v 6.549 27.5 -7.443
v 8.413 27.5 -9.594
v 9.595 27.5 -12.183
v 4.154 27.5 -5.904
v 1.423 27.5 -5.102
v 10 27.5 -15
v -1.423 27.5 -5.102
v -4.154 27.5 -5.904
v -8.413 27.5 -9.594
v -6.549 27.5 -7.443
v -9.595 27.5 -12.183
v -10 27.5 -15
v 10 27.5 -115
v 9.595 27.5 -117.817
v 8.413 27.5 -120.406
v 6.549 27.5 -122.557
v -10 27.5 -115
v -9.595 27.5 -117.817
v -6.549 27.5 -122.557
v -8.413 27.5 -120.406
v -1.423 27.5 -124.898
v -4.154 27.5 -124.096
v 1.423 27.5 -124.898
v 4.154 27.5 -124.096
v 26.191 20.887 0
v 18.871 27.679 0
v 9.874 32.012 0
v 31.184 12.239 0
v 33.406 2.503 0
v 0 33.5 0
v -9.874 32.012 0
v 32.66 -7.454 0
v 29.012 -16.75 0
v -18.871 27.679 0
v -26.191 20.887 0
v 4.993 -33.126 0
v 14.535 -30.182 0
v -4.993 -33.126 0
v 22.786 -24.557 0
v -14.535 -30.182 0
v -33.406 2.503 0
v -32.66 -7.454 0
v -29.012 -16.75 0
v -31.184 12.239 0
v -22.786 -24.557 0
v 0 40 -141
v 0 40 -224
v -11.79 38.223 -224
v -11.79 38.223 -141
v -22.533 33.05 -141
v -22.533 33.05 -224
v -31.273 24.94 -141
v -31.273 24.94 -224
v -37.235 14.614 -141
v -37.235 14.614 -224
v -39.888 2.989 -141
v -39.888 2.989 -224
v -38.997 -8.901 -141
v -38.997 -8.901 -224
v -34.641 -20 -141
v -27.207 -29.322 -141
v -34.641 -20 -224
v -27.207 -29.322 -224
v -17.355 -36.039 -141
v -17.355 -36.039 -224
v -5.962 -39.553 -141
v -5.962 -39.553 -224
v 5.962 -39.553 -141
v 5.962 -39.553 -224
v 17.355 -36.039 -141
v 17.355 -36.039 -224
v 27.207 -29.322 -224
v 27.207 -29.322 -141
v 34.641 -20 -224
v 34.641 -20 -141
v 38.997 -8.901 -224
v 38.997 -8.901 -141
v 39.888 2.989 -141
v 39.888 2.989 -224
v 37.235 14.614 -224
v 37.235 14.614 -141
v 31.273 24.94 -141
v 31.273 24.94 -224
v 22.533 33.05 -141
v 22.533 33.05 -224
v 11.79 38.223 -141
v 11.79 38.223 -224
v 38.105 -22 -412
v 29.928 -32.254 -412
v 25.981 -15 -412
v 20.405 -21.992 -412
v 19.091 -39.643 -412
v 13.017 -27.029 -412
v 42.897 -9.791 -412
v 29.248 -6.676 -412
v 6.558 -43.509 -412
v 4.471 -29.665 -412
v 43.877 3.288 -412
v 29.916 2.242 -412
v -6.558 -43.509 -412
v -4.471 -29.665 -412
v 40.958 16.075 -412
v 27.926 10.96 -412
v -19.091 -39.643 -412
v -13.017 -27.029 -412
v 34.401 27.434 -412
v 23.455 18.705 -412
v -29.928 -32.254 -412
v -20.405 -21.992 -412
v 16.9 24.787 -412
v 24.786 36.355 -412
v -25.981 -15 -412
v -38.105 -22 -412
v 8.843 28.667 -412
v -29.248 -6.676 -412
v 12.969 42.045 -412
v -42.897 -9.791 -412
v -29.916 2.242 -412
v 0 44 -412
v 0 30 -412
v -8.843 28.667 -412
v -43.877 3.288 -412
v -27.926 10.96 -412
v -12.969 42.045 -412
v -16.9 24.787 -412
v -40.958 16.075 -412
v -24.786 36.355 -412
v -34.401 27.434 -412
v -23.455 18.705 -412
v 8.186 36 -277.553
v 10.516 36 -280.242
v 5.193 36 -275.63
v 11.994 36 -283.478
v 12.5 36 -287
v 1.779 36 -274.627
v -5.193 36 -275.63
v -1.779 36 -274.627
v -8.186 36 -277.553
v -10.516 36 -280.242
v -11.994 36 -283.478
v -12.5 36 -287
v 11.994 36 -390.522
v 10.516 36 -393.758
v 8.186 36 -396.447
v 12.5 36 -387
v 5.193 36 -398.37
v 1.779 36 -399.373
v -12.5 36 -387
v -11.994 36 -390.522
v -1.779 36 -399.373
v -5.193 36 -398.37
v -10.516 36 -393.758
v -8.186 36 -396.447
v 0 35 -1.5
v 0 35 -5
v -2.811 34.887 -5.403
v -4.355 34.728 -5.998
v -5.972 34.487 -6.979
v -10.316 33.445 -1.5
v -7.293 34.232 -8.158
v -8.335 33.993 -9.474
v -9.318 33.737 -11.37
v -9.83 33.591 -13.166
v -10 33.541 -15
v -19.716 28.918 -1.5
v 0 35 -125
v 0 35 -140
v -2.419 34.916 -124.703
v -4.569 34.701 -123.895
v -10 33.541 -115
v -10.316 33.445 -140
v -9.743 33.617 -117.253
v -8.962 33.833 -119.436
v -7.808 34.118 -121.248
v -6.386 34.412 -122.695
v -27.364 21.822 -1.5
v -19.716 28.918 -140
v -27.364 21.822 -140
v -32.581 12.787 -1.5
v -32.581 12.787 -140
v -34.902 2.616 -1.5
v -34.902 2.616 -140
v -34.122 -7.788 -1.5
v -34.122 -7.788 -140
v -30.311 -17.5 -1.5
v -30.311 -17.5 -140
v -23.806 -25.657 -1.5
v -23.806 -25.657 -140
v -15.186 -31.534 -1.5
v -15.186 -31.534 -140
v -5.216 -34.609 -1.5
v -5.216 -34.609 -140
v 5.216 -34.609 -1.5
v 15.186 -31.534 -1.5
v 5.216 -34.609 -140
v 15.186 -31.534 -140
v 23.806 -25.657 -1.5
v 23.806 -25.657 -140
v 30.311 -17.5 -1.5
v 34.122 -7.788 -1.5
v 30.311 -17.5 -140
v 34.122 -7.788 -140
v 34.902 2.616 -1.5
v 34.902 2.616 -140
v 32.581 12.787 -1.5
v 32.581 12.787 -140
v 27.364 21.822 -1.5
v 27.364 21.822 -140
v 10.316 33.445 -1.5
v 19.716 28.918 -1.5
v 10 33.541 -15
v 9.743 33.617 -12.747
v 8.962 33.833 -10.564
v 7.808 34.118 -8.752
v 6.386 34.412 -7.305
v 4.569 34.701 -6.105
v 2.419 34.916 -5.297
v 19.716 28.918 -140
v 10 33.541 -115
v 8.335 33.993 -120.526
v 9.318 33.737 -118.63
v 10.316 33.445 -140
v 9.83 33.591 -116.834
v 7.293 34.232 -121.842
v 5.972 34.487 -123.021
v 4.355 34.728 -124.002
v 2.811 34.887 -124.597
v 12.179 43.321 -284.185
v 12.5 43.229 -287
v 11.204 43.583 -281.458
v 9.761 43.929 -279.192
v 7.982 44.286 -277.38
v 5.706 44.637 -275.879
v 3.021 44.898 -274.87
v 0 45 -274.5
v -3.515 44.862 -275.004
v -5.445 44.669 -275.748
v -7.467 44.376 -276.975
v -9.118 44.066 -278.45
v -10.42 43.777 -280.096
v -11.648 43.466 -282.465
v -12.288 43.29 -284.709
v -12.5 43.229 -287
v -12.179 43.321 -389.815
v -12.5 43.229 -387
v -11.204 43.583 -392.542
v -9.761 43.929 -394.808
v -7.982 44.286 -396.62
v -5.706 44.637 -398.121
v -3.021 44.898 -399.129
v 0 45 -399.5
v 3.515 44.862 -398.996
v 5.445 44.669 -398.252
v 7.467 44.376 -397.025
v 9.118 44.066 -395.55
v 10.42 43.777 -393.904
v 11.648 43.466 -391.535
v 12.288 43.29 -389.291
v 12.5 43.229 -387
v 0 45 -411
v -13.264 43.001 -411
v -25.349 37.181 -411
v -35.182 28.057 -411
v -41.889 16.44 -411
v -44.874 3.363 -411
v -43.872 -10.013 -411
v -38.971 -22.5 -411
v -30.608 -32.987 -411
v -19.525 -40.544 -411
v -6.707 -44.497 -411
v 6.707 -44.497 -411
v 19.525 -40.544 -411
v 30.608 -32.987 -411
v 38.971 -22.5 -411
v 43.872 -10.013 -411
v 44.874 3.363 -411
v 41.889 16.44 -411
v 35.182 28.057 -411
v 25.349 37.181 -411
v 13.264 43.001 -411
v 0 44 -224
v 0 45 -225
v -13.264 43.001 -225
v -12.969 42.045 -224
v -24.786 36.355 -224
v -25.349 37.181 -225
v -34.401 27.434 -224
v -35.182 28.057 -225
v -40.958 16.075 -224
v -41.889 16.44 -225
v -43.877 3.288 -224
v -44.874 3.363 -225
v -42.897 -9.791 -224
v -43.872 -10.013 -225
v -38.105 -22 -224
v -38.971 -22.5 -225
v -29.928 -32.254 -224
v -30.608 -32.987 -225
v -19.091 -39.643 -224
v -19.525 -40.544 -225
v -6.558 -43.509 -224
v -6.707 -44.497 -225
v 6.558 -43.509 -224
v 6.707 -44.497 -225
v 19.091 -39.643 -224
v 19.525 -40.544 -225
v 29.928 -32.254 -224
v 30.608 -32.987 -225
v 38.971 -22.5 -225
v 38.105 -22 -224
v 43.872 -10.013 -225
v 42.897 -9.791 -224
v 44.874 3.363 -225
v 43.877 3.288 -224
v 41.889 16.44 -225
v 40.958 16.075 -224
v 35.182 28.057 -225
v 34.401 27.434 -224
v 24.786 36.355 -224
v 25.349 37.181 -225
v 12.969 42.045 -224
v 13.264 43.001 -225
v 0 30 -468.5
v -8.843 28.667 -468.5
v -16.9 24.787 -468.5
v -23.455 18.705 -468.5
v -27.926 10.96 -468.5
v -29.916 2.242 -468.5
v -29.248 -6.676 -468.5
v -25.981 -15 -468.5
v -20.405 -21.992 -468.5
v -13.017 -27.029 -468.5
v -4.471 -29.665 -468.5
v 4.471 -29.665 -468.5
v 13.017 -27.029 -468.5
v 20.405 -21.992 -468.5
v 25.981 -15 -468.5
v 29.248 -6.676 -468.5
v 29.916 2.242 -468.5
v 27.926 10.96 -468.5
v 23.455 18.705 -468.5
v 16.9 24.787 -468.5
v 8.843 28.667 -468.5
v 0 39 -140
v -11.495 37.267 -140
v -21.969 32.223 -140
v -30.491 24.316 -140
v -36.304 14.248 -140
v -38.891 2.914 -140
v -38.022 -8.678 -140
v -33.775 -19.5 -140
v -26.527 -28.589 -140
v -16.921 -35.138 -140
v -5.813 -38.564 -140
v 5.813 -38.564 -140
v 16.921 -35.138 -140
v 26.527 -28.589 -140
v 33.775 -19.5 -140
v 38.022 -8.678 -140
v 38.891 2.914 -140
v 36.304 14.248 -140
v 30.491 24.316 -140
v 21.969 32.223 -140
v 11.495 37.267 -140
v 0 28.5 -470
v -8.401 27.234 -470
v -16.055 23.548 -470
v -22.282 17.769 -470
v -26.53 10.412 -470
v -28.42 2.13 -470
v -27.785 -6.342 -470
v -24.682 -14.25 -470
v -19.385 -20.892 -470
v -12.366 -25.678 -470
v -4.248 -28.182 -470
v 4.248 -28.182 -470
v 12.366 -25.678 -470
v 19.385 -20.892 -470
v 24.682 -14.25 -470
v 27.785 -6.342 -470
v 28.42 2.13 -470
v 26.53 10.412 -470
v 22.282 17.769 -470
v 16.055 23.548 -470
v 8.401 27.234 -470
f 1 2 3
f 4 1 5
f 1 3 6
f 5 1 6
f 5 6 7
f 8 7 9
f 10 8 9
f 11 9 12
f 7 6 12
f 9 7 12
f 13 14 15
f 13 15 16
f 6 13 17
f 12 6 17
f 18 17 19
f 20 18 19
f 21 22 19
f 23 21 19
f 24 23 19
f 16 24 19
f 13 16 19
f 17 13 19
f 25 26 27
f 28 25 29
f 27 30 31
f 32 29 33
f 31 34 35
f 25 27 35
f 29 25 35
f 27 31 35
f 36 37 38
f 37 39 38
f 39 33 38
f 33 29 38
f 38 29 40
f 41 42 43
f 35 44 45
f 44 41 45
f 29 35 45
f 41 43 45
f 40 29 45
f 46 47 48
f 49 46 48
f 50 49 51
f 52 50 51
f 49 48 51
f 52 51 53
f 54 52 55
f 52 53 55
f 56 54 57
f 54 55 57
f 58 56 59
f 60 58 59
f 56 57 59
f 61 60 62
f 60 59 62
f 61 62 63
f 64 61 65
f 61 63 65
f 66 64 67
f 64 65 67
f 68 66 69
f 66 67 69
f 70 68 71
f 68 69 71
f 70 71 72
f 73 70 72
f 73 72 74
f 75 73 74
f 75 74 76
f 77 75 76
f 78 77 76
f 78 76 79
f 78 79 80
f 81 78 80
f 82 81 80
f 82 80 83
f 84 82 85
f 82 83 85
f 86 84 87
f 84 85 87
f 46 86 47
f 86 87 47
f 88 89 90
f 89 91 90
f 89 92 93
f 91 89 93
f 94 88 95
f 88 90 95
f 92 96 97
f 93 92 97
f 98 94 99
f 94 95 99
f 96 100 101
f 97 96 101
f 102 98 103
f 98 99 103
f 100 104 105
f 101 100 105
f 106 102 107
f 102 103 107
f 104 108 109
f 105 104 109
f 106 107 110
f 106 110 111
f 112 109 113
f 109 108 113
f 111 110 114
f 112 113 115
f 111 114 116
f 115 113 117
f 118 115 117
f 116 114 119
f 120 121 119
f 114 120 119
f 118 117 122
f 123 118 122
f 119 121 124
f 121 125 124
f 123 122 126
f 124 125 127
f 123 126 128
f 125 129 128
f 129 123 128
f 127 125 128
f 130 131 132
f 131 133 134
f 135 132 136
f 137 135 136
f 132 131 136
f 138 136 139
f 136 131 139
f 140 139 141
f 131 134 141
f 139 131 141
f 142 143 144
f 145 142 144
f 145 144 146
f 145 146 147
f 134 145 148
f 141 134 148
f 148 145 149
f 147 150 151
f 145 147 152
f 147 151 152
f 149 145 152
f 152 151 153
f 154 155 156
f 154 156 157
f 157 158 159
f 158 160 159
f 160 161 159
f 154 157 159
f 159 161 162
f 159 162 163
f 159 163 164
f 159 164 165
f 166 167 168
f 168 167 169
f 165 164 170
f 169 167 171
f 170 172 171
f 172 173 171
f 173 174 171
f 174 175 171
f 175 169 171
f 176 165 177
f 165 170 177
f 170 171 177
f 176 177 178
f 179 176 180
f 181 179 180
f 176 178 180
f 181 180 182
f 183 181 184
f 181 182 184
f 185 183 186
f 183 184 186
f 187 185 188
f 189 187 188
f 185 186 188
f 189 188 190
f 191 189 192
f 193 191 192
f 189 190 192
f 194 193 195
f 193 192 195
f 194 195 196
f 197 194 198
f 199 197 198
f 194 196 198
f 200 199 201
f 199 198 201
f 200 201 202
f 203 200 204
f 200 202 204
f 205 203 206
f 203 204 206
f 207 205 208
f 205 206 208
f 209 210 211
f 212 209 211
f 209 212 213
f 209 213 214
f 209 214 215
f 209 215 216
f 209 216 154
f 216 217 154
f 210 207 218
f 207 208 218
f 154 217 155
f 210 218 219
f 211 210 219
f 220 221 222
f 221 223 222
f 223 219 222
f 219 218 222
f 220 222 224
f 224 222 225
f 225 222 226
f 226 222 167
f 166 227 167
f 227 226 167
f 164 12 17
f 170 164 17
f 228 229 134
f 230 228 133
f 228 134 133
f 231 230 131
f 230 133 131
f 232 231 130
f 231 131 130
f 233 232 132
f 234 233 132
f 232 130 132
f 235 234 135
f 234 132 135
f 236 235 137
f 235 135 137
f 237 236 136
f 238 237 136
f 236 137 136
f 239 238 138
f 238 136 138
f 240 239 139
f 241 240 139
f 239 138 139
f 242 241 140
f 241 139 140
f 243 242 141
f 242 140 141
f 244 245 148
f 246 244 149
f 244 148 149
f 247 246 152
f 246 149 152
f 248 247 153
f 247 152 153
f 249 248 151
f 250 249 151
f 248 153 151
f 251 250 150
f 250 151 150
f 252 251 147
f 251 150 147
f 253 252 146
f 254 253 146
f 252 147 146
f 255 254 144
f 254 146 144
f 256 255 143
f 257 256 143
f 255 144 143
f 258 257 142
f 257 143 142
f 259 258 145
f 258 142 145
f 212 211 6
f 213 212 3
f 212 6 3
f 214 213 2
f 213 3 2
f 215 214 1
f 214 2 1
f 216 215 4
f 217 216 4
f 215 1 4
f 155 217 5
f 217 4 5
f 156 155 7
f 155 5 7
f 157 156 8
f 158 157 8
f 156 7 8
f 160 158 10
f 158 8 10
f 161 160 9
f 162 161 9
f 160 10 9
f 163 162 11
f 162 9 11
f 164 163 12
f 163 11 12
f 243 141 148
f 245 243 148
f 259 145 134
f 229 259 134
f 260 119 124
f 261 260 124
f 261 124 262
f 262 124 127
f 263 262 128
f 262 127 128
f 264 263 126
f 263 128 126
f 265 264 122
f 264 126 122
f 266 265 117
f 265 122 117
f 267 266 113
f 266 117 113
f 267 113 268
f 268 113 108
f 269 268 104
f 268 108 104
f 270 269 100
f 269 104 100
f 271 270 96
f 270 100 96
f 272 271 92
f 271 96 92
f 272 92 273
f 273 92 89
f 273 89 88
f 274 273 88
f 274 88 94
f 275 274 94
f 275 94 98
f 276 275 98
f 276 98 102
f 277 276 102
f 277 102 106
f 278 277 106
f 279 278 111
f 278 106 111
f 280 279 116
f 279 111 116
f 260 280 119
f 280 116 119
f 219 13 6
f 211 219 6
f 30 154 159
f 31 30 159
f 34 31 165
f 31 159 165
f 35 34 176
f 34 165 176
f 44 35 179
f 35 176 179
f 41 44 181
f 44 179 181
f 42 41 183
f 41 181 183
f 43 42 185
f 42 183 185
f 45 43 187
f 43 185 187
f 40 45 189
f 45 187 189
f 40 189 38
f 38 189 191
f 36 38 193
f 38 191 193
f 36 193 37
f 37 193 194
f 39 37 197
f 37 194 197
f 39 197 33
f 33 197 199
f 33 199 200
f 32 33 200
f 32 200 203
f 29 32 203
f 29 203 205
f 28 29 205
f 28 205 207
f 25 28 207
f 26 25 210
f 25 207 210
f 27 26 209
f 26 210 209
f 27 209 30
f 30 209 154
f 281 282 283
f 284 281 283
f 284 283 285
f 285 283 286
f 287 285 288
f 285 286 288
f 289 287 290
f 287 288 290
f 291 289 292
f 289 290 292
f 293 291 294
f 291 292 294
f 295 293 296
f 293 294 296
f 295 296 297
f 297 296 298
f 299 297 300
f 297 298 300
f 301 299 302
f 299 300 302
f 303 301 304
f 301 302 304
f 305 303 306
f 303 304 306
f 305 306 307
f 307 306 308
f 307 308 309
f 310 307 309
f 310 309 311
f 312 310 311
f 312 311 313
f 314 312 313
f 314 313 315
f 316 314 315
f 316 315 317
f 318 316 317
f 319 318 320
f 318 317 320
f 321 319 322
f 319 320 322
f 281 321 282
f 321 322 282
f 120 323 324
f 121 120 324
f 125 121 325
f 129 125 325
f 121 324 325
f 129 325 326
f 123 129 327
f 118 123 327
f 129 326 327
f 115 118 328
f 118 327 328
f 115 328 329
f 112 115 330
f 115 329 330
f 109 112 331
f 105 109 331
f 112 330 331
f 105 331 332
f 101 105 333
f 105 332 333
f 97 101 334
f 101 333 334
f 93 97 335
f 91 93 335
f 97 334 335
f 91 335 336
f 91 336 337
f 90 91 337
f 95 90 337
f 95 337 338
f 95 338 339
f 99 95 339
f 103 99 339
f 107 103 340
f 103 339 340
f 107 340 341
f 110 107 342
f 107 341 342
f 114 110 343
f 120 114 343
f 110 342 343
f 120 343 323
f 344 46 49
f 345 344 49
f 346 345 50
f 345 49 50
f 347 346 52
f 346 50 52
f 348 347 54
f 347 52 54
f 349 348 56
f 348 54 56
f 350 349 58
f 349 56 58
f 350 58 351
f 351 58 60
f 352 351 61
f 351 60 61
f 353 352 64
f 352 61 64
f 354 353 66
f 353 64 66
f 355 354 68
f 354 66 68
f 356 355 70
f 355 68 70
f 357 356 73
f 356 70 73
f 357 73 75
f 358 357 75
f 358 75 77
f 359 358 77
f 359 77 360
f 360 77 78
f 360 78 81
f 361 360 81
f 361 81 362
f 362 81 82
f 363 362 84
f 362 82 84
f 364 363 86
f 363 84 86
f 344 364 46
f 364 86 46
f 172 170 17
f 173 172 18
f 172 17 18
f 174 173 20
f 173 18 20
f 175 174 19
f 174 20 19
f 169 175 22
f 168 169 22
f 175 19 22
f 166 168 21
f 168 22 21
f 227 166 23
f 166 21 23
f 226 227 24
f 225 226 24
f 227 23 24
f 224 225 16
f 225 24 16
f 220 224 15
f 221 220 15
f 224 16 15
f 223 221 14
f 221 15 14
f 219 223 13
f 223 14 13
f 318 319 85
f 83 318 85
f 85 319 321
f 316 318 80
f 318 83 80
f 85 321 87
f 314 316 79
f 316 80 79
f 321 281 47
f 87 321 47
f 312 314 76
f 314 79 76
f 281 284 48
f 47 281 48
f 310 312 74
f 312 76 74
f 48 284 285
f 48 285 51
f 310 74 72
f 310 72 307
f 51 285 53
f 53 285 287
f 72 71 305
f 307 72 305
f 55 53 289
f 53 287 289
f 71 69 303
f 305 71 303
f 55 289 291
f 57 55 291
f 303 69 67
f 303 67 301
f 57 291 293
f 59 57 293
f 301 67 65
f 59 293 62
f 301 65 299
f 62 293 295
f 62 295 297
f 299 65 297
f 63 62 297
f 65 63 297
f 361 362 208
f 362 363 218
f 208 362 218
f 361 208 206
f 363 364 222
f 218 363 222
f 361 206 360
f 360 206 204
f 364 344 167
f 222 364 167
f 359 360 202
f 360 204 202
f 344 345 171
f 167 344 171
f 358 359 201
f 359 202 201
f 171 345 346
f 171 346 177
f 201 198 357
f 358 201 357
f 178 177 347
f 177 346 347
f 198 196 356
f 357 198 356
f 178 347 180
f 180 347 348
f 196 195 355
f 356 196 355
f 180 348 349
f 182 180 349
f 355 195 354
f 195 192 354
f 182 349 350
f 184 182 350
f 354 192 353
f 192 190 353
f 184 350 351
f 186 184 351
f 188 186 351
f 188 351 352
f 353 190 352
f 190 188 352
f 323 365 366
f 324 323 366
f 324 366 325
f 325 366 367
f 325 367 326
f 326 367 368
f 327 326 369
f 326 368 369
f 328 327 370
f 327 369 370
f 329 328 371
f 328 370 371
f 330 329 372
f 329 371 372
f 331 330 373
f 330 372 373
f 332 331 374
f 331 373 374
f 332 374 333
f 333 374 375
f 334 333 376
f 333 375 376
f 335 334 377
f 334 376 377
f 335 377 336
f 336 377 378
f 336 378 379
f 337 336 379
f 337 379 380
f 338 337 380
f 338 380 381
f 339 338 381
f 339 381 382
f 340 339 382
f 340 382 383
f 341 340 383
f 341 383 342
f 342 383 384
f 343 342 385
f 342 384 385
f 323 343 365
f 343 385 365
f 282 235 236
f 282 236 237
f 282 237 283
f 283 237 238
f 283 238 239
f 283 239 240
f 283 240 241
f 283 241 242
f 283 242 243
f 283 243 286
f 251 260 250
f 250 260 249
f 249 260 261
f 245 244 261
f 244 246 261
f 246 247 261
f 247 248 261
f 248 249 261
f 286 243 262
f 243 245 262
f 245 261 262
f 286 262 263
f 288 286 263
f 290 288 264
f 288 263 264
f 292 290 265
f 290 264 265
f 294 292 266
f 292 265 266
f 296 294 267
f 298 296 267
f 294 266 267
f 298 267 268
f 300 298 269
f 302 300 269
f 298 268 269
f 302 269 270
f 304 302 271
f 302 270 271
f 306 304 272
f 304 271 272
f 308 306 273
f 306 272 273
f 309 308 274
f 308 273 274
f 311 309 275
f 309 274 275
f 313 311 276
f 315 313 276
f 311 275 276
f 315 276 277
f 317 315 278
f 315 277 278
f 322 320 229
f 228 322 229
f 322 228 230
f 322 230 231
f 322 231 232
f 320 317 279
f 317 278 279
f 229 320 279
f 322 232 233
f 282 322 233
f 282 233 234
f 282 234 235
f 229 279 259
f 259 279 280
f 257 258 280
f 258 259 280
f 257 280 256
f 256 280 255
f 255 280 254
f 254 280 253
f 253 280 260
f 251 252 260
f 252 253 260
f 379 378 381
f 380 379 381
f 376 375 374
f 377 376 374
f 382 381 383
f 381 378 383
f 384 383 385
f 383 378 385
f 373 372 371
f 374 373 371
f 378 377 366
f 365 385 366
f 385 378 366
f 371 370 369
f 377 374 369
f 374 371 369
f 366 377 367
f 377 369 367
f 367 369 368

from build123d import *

# Parameters (mm, degrees)
CUT_EXTRUDE1_START = 27.5
CUT_EXTRUDE1_DEPTH = 10
CUT_EXTRUDE2_START = 36
CUT_EXTRUDE2_DEPTH = 10
CHAMFER1_SIZE      = 1.5
CHAMFER2_SIZE      = 1


with BuildPart() as part:
    # Sketch1 → Revolve1 (revolve)
    with BuildSketch(Plane(origin=(0, 0, 0), x_dir=(0, 0, -1), z_dir=(1, 0, 0))):
        Polygon((0, 0), (0, 35), (140, 35), (140, 40), (224, 40), (224, 45), (412, 45), (412, 30), (470, 30), (470, 0), align=None)
    revolve(axis=Axis((0, 0, -470), (0, 0, 1)))

    # Sketch2 → Cut-Extrude1 (cut)
    with BuildSketch(Plane(origin=(0, 0, 0), x_dir=(1, 0, 0), z_dir=(0, 1, 0)).offset(CUT_EXTRUDE1_START)):
        with BuildLine():
            Line((-10, 15), (-10, 115))
            ThreePointArc((-10, 115), (0, 125), (10, 115))
            Line((10, 115), (10, 15))
            ThreePointArc((10, 15), (0, 5), (-10, 15))
        make_face()
    extrude(amount=CUT_EXTRUDE1_DEPTH, mode=Mode.SUBTRACT)

    # Sketch4 → Cut-Extrude2 (cut)
    with BuildSketch(Plane(origin=(0, 0, 0), x_dir=(1, 0, 0), z_dir=(0, 1, 0)).offset(CUT_EXTRUDE2_START)):
        with BuildLine():
            Line((12.5, 387), (12.5, 287))
            ThreePointArc((12.5, 287), (0, 274.5), (-12.5, 287))
            Line((-12.5, 287), (-12.5, 387))
            ThreePointArc((-12.5, 387), (0, 399.5), (12.5, 387))
        make_face()
    extrude(amount=CUT_EXTRUDE2_DEPTH, mode=Mode.SUBTRACT)

    # Chamfer1
    chamfer1_edges = [part.edges().sort_by_distance(p)[0] for p in [
        (0, -35, 0),
        (0, -30, -470),
    ]]
    chamfer(chamfer1_edges, length=CHAMFER1_SIZE)

    # Chamfer2
    chamfer2_edges = [part.edges().sort_by_distance(p)[0] for p in [
        (0, -40, -140),
        (0, -45, -412),
        (0, -45, -224),
    ]]
    chamfer(chamfer2_edges, length=CHAMFER2_SIZE)


solid = part.part
